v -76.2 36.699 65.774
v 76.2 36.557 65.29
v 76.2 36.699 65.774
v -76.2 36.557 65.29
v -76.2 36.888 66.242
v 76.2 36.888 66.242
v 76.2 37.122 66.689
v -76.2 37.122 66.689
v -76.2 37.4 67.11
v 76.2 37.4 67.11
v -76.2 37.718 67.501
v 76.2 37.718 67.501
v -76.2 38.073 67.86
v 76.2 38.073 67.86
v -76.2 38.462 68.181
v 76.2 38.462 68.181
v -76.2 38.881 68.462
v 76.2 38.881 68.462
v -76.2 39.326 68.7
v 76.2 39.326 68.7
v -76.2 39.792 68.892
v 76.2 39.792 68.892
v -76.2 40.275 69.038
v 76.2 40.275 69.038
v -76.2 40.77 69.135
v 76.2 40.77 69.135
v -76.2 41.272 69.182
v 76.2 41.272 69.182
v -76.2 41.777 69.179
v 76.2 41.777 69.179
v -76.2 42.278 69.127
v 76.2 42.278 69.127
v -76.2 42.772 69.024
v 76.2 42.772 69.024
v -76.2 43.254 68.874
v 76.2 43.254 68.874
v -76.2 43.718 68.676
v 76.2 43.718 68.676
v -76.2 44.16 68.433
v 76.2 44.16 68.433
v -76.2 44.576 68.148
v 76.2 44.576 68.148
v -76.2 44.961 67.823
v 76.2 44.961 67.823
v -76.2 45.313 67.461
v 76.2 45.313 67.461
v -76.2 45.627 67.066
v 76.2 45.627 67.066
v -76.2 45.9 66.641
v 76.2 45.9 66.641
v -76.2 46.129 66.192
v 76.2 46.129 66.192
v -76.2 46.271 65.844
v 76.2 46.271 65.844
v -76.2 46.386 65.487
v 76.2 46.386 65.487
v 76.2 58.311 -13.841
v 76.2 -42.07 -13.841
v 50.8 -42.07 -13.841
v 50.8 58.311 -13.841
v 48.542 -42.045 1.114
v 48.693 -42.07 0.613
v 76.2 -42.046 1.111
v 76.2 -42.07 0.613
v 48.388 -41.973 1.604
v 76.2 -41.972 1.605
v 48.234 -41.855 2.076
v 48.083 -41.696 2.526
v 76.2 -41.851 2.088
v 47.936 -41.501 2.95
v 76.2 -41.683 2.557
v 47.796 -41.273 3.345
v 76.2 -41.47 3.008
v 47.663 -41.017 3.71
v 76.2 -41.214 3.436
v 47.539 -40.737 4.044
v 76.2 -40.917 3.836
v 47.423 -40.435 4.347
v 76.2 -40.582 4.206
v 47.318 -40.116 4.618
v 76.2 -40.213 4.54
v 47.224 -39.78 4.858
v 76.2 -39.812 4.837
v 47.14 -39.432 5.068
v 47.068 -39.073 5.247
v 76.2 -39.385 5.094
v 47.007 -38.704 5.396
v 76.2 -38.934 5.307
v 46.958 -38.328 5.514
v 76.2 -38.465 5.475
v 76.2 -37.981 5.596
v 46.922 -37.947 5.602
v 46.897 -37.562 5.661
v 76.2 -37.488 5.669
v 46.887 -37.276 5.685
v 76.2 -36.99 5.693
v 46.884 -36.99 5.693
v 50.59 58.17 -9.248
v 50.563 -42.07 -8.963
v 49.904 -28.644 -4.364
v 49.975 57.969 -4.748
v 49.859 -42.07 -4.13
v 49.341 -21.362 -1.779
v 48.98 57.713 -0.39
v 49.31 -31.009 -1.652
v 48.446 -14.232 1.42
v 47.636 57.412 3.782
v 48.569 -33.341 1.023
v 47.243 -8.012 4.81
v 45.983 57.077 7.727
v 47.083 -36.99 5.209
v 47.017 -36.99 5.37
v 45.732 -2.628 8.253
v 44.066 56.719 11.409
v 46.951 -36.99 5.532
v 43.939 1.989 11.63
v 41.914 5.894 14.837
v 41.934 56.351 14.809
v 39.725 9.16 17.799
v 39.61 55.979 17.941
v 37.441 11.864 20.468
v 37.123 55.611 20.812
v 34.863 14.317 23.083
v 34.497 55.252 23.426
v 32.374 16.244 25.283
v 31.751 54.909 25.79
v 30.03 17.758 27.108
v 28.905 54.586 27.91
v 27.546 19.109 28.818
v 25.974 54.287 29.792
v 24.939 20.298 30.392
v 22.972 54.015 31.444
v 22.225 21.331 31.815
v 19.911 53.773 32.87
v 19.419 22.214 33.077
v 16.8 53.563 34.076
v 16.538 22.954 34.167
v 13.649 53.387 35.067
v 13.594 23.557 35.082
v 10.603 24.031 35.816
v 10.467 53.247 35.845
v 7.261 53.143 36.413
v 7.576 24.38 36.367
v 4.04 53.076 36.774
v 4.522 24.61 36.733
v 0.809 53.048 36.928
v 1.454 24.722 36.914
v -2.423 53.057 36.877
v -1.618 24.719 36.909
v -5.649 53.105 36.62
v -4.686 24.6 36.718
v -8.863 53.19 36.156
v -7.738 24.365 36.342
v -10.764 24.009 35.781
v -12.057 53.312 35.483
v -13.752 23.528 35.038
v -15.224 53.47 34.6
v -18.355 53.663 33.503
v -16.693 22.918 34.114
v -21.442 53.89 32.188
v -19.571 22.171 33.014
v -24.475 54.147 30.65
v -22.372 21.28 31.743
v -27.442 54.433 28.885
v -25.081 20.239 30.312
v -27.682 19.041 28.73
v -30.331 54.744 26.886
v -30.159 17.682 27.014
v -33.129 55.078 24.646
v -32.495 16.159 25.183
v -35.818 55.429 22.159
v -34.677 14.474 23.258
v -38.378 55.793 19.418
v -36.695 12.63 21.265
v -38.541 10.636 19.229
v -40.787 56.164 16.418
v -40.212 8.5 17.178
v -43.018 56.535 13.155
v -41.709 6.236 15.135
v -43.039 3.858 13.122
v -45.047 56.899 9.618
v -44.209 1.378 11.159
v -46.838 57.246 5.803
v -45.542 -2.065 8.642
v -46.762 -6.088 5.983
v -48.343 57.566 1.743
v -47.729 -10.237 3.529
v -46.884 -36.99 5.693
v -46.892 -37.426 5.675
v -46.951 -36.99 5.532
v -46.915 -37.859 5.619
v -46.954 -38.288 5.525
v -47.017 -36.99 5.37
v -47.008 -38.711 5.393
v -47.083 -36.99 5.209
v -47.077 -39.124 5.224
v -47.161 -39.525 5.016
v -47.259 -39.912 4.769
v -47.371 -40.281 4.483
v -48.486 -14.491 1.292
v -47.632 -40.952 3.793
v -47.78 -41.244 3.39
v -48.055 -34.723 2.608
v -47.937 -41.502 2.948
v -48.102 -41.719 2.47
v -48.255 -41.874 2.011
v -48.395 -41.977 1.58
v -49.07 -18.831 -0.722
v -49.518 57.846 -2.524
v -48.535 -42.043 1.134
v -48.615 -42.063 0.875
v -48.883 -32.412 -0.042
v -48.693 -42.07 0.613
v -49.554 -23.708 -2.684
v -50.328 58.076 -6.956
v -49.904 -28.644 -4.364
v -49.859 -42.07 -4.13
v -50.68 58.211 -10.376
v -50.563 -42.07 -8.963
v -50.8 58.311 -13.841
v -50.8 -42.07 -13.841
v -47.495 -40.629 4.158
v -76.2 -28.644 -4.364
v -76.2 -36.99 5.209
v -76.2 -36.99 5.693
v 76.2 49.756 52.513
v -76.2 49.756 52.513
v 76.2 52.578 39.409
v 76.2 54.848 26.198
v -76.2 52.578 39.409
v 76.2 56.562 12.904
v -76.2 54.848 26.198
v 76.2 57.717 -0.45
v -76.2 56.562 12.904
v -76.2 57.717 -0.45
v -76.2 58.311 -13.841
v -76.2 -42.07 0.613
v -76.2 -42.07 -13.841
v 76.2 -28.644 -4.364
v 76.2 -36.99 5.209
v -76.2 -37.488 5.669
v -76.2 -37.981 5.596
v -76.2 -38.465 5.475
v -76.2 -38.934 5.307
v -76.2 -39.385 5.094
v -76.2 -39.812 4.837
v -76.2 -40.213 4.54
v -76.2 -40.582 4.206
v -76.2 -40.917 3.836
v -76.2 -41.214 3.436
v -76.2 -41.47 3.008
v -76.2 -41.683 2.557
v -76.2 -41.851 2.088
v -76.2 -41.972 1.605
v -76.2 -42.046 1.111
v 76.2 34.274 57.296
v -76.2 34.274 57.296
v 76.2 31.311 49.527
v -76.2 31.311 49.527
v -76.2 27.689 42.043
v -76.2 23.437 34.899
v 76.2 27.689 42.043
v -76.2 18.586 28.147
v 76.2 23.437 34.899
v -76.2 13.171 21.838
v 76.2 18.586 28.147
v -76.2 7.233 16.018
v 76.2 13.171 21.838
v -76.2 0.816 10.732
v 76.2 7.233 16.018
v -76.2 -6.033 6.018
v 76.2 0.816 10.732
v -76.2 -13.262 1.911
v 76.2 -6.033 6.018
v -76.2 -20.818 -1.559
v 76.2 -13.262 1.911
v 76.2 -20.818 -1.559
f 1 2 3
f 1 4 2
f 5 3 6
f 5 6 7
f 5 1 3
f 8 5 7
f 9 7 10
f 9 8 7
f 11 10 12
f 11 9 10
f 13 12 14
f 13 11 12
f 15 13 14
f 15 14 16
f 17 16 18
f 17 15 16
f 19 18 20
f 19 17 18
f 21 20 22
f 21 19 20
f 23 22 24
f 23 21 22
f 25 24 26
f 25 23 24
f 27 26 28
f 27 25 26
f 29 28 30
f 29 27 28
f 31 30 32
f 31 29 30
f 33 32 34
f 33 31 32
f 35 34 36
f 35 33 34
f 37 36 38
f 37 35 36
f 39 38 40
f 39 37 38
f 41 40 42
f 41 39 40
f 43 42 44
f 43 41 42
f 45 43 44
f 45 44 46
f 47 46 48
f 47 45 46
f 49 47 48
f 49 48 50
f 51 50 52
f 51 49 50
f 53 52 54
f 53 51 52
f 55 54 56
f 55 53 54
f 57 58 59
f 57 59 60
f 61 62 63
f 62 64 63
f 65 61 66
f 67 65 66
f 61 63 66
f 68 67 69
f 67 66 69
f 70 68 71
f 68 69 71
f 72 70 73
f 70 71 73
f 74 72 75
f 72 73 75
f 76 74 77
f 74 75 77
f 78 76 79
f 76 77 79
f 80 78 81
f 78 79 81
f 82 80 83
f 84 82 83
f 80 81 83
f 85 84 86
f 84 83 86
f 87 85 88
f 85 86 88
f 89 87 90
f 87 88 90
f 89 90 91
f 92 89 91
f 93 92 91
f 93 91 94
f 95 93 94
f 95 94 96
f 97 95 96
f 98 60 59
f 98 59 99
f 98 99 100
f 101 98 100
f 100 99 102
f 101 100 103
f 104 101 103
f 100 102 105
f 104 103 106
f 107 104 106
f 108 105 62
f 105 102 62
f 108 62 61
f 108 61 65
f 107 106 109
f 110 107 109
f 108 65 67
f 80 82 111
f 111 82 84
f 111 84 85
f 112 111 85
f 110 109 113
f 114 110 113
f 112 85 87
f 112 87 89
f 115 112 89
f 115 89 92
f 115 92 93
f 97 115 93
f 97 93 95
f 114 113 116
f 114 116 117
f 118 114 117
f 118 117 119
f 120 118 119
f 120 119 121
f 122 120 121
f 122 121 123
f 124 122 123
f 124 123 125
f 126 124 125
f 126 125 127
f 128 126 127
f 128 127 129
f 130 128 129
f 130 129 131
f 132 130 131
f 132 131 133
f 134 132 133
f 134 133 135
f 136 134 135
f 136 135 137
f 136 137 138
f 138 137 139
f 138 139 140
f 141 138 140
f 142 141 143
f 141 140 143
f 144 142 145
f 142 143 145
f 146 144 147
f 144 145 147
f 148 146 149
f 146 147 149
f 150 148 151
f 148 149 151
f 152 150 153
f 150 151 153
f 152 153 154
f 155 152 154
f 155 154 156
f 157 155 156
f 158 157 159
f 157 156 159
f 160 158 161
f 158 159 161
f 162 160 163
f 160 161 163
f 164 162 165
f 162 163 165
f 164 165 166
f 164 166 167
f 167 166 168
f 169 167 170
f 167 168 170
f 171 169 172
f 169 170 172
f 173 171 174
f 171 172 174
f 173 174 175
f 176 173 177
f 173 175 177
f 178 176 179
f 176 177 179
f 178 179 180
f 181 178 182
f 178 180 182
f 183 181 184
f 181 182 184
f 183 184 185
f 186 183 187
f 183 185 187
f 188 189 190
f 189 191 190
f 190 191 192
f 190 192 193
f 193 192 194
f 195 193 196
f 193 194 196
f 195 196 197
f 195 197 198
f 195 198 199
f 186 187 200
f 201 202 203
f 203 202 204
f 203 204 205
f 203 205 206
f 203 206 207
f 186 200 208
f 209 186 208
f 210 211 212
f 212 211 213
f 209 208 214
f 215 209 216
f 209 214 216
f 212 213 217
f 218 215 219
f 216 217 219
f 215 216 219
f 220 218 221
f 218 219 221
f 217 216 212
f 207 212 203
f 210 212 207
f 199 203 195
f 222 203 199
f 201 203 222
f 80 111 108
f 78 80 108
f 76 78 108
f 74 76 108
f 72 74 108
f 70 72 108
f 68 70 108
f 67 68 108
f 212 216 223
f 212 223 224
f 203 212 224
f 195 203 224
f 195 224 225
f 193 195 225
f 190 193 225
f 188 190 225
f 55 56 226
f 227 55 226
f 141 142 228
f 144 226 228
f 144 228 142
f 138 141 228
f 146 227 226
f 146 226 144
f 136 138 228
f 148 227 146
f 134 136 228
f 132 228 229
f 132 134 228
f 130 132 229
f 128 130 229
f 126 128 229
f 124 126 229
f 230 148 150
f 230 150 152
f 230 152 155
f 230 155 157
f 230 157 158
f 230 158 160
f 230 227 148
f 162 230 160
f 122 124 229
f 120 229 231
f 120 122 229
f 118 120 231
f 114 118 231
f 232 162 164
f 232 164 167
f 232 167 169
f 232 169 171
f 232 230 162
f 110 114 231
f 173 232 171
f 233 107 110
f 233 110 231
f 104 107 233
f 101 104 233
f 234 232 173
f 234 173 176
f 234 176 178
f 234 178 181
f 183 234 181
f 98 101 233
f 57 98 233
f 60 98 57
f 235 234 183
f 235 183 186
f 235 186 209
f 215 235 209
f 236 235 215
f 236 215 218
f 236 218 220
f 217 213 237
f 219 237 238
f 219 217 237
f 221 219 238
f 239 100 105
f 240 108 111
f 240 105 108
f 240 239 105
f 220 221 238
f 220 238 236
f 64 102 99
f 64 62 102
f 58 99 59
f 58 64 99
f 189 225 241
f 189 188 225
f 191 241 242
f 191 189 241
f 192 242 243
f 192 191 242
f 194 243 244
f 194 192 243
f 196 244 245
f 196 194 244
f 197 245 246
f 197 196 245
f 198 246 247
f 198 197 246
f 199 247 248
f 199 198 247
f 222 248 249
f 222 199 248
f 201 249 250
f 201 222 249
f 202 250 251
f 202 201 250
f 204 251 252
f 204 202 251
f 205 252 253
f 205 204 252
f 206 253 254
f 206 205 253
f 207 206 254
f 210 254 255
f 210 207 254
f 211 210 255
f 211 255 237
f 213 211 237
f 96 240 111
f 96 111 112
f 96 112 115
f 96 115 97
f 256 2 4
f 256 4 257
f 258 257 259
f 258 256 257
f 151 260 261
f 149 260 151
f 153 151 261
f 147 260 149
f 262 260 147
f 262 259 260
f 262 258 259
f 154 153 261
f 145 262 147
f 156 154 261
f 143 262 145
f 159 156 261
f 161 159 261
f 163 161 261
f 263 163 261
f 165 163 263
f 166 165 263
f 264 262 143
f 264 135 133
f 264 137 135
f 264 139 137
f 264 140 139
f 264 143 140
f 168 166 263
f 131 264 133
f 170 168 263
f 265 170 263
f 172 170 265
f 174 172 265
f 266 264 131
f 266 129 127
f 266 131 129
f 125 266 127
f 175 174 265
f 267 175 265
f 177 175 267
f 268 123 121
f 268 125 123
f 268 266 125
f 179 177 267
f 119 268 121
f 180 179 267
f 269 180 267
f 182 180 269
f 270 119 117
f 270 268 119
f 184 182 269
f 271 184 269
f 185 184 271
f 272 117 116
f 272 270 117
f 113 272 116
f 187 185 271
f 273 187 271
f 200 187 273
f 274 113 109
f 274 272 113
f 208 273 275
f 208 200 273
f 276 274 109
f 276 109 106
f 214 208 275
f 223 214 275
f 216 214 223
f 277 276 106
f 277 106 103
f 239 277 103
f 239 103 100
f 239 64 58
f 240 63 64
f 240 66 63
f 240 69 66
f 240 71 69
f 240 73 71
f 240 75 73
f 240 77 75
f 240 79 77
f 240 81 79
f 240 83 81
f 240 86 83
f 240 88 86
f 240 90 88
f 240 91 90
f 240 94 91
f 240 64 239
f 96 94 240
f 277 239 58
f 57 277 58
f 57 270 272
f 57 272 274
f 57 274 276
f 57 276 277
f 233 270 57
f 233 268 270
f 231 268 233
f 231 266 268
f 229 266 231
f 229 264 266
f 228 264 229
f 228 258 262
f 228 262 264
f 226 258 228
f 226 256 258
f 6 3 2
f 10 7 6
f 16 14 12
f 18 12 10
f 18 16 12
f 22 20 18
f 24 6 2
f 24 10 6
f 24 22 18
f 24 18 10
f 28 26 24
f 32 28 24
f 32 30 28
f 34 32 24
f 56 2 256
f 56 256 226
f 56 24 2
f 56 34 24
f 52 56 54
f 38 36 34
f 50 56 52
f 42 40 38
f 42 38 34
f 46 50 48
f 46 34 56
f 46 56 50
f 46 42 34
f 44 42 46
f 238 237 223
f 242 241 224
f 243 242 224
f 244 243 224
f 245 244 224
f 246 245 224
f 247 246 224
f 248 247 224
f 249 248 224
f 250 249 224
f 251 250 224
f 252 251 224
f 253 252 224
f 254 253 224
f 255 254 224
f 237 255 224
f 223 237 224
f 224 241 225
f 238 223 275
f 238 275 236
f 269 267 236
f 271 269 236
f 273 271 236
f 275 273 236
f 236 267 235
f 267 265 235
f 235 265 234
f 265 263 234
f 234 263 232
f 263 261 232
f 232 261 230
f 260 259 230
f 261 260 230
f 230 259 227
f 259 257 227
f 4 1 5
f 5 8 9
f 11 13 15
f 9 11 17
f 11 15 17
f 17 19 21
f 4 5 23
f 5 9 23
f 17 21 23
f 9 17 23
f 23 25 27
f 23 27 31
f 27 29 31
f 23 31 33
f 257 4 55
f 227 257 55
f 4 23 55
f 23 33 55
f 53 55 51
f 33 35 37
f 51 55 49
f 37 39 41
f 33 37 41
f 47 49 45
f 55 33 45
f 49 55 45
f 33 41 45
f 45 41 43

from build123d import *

# Parameters (mm, degrees)
F0_W        = 19.1873764305
F0_H        = 101.6
F1_DEPTH    = 76.2
F3_DEPTH    = 67.31
F4_T1_DEPTH = 697.6501262753
F5_R        = 5.07999
F6_R        = 5.08


# Not quite as in the source:
# - a fillet or chamfer that OpenCascade refuses, or shapes differently, is made with other operations: its cross-section is extruded or revolved along the edge and cut away or added
# - a fillet or chamfer is up to 0.001 mm smaller than in the source, because OpenCascade refuses the exact size


with BuildPart() as f1:
    # F0 (on Right) → F1 (new body, symmetric)
    with BuildSketch(Plane.YZ):
        with BuildLine():
            Line((-28.6442058678, -4.364277937), (-36.9899753063, 5.2085028753))
            Line((-36.9899753063, 5.2085028753), (-36.9899753063, -13.8414971247))
            Line((-36.9899753063, -13.8414971247), (39.2100246937, -13.8414971247))
            Line((39.2100246937, -13.8414971247), (39.2100246937, 87.7585028753))
            ThreePointArc((39.2100246937, 87.7585028753), (20.4155377225, 30.5509785676), (-28.6442058678, -4.364277937))
        make_face()
        Polygon((-36.9899753063, -13.8414971247), (-36.9899753063, 5.2085028753), (-36.9899753063, 5.6934356689), (-42.0699753063, 5.6934356689), (-42.0699753063, -13.8414971247), align=None)
        with Locations((48.803712909, 36.9585028753)):
            Rectangle(F0_W, F0_H)
    extrude(amount=F1_DEPTH, both=True)

    # F2 (on Front) → F3 (cut, symmetric)
    with BuildSketch(Plane.XZ):
        with BuildLine():
            ThreePointArc((50.7993000876, -14.1734545694), (0.1539604747, 36.9344649658), (-50.8002333049, -13.8655350342))
            Line((-50.8002333049, -13.8655350342), (50.7993000876, -14.1734545694))
        make_face()
    extrude(amount=F3_DEPTH, both=True, mode=Mode.SUBTRACT)

    # F4: fillet of radius 319.4825375631 on 1 edges, made by hand

    # F4_s2 → F4_t1 (cut)
    with BuildSketch(Plane.YZ.offset(-348.8250631377)):
        with BuildLine():
            ThreePointArc((39.2100246937, 87.7585028753), (53.5639950587, 34.0710629609), (58.3974011242, -21.2915223798))
            Line((58.3974011242, -21.2915223798), (64.7870518755, -21.2915223798))
            Line((64.7870518755, -21.2915223798), (64.7870518755, 87.7585028753))
            Line((64.7870518755, 87.7585028753), (58.3974011242, 94.1481536266))
            ThreePointArc((58.3974011242, 94.1481536266), (48.803712909, 94.1481536266), (45.2159279163, 89.9395033804))
            Line((45.2159279163, 89.9395033804), (39.2100246937, 87.7585028753))
        make_face()
    extrude(amount=F4_T1_DEPTH, mode=Mode.SUBTRACT)

    # F5 (radius 5.08 in the source; OpenCascade refuses exactly that, so slightly less here)
    f5_edges = [f1.edges().sort_by_distance(p)[0] for p in [
        (-61.542005, -42.069975, 5.693436),
        (61.542005, -42.069975, 5.693436),
    ]]
    fillet(f5_edges, radius=F5_R)

    # F6
    f6_edges = [f1.edges().sort_by_distance(p)[0] for p in [
        (0, 39.210025, 87.758503),
    ]]
    fillet(f6_edges, radius=F6_R)


solid = f1.part
